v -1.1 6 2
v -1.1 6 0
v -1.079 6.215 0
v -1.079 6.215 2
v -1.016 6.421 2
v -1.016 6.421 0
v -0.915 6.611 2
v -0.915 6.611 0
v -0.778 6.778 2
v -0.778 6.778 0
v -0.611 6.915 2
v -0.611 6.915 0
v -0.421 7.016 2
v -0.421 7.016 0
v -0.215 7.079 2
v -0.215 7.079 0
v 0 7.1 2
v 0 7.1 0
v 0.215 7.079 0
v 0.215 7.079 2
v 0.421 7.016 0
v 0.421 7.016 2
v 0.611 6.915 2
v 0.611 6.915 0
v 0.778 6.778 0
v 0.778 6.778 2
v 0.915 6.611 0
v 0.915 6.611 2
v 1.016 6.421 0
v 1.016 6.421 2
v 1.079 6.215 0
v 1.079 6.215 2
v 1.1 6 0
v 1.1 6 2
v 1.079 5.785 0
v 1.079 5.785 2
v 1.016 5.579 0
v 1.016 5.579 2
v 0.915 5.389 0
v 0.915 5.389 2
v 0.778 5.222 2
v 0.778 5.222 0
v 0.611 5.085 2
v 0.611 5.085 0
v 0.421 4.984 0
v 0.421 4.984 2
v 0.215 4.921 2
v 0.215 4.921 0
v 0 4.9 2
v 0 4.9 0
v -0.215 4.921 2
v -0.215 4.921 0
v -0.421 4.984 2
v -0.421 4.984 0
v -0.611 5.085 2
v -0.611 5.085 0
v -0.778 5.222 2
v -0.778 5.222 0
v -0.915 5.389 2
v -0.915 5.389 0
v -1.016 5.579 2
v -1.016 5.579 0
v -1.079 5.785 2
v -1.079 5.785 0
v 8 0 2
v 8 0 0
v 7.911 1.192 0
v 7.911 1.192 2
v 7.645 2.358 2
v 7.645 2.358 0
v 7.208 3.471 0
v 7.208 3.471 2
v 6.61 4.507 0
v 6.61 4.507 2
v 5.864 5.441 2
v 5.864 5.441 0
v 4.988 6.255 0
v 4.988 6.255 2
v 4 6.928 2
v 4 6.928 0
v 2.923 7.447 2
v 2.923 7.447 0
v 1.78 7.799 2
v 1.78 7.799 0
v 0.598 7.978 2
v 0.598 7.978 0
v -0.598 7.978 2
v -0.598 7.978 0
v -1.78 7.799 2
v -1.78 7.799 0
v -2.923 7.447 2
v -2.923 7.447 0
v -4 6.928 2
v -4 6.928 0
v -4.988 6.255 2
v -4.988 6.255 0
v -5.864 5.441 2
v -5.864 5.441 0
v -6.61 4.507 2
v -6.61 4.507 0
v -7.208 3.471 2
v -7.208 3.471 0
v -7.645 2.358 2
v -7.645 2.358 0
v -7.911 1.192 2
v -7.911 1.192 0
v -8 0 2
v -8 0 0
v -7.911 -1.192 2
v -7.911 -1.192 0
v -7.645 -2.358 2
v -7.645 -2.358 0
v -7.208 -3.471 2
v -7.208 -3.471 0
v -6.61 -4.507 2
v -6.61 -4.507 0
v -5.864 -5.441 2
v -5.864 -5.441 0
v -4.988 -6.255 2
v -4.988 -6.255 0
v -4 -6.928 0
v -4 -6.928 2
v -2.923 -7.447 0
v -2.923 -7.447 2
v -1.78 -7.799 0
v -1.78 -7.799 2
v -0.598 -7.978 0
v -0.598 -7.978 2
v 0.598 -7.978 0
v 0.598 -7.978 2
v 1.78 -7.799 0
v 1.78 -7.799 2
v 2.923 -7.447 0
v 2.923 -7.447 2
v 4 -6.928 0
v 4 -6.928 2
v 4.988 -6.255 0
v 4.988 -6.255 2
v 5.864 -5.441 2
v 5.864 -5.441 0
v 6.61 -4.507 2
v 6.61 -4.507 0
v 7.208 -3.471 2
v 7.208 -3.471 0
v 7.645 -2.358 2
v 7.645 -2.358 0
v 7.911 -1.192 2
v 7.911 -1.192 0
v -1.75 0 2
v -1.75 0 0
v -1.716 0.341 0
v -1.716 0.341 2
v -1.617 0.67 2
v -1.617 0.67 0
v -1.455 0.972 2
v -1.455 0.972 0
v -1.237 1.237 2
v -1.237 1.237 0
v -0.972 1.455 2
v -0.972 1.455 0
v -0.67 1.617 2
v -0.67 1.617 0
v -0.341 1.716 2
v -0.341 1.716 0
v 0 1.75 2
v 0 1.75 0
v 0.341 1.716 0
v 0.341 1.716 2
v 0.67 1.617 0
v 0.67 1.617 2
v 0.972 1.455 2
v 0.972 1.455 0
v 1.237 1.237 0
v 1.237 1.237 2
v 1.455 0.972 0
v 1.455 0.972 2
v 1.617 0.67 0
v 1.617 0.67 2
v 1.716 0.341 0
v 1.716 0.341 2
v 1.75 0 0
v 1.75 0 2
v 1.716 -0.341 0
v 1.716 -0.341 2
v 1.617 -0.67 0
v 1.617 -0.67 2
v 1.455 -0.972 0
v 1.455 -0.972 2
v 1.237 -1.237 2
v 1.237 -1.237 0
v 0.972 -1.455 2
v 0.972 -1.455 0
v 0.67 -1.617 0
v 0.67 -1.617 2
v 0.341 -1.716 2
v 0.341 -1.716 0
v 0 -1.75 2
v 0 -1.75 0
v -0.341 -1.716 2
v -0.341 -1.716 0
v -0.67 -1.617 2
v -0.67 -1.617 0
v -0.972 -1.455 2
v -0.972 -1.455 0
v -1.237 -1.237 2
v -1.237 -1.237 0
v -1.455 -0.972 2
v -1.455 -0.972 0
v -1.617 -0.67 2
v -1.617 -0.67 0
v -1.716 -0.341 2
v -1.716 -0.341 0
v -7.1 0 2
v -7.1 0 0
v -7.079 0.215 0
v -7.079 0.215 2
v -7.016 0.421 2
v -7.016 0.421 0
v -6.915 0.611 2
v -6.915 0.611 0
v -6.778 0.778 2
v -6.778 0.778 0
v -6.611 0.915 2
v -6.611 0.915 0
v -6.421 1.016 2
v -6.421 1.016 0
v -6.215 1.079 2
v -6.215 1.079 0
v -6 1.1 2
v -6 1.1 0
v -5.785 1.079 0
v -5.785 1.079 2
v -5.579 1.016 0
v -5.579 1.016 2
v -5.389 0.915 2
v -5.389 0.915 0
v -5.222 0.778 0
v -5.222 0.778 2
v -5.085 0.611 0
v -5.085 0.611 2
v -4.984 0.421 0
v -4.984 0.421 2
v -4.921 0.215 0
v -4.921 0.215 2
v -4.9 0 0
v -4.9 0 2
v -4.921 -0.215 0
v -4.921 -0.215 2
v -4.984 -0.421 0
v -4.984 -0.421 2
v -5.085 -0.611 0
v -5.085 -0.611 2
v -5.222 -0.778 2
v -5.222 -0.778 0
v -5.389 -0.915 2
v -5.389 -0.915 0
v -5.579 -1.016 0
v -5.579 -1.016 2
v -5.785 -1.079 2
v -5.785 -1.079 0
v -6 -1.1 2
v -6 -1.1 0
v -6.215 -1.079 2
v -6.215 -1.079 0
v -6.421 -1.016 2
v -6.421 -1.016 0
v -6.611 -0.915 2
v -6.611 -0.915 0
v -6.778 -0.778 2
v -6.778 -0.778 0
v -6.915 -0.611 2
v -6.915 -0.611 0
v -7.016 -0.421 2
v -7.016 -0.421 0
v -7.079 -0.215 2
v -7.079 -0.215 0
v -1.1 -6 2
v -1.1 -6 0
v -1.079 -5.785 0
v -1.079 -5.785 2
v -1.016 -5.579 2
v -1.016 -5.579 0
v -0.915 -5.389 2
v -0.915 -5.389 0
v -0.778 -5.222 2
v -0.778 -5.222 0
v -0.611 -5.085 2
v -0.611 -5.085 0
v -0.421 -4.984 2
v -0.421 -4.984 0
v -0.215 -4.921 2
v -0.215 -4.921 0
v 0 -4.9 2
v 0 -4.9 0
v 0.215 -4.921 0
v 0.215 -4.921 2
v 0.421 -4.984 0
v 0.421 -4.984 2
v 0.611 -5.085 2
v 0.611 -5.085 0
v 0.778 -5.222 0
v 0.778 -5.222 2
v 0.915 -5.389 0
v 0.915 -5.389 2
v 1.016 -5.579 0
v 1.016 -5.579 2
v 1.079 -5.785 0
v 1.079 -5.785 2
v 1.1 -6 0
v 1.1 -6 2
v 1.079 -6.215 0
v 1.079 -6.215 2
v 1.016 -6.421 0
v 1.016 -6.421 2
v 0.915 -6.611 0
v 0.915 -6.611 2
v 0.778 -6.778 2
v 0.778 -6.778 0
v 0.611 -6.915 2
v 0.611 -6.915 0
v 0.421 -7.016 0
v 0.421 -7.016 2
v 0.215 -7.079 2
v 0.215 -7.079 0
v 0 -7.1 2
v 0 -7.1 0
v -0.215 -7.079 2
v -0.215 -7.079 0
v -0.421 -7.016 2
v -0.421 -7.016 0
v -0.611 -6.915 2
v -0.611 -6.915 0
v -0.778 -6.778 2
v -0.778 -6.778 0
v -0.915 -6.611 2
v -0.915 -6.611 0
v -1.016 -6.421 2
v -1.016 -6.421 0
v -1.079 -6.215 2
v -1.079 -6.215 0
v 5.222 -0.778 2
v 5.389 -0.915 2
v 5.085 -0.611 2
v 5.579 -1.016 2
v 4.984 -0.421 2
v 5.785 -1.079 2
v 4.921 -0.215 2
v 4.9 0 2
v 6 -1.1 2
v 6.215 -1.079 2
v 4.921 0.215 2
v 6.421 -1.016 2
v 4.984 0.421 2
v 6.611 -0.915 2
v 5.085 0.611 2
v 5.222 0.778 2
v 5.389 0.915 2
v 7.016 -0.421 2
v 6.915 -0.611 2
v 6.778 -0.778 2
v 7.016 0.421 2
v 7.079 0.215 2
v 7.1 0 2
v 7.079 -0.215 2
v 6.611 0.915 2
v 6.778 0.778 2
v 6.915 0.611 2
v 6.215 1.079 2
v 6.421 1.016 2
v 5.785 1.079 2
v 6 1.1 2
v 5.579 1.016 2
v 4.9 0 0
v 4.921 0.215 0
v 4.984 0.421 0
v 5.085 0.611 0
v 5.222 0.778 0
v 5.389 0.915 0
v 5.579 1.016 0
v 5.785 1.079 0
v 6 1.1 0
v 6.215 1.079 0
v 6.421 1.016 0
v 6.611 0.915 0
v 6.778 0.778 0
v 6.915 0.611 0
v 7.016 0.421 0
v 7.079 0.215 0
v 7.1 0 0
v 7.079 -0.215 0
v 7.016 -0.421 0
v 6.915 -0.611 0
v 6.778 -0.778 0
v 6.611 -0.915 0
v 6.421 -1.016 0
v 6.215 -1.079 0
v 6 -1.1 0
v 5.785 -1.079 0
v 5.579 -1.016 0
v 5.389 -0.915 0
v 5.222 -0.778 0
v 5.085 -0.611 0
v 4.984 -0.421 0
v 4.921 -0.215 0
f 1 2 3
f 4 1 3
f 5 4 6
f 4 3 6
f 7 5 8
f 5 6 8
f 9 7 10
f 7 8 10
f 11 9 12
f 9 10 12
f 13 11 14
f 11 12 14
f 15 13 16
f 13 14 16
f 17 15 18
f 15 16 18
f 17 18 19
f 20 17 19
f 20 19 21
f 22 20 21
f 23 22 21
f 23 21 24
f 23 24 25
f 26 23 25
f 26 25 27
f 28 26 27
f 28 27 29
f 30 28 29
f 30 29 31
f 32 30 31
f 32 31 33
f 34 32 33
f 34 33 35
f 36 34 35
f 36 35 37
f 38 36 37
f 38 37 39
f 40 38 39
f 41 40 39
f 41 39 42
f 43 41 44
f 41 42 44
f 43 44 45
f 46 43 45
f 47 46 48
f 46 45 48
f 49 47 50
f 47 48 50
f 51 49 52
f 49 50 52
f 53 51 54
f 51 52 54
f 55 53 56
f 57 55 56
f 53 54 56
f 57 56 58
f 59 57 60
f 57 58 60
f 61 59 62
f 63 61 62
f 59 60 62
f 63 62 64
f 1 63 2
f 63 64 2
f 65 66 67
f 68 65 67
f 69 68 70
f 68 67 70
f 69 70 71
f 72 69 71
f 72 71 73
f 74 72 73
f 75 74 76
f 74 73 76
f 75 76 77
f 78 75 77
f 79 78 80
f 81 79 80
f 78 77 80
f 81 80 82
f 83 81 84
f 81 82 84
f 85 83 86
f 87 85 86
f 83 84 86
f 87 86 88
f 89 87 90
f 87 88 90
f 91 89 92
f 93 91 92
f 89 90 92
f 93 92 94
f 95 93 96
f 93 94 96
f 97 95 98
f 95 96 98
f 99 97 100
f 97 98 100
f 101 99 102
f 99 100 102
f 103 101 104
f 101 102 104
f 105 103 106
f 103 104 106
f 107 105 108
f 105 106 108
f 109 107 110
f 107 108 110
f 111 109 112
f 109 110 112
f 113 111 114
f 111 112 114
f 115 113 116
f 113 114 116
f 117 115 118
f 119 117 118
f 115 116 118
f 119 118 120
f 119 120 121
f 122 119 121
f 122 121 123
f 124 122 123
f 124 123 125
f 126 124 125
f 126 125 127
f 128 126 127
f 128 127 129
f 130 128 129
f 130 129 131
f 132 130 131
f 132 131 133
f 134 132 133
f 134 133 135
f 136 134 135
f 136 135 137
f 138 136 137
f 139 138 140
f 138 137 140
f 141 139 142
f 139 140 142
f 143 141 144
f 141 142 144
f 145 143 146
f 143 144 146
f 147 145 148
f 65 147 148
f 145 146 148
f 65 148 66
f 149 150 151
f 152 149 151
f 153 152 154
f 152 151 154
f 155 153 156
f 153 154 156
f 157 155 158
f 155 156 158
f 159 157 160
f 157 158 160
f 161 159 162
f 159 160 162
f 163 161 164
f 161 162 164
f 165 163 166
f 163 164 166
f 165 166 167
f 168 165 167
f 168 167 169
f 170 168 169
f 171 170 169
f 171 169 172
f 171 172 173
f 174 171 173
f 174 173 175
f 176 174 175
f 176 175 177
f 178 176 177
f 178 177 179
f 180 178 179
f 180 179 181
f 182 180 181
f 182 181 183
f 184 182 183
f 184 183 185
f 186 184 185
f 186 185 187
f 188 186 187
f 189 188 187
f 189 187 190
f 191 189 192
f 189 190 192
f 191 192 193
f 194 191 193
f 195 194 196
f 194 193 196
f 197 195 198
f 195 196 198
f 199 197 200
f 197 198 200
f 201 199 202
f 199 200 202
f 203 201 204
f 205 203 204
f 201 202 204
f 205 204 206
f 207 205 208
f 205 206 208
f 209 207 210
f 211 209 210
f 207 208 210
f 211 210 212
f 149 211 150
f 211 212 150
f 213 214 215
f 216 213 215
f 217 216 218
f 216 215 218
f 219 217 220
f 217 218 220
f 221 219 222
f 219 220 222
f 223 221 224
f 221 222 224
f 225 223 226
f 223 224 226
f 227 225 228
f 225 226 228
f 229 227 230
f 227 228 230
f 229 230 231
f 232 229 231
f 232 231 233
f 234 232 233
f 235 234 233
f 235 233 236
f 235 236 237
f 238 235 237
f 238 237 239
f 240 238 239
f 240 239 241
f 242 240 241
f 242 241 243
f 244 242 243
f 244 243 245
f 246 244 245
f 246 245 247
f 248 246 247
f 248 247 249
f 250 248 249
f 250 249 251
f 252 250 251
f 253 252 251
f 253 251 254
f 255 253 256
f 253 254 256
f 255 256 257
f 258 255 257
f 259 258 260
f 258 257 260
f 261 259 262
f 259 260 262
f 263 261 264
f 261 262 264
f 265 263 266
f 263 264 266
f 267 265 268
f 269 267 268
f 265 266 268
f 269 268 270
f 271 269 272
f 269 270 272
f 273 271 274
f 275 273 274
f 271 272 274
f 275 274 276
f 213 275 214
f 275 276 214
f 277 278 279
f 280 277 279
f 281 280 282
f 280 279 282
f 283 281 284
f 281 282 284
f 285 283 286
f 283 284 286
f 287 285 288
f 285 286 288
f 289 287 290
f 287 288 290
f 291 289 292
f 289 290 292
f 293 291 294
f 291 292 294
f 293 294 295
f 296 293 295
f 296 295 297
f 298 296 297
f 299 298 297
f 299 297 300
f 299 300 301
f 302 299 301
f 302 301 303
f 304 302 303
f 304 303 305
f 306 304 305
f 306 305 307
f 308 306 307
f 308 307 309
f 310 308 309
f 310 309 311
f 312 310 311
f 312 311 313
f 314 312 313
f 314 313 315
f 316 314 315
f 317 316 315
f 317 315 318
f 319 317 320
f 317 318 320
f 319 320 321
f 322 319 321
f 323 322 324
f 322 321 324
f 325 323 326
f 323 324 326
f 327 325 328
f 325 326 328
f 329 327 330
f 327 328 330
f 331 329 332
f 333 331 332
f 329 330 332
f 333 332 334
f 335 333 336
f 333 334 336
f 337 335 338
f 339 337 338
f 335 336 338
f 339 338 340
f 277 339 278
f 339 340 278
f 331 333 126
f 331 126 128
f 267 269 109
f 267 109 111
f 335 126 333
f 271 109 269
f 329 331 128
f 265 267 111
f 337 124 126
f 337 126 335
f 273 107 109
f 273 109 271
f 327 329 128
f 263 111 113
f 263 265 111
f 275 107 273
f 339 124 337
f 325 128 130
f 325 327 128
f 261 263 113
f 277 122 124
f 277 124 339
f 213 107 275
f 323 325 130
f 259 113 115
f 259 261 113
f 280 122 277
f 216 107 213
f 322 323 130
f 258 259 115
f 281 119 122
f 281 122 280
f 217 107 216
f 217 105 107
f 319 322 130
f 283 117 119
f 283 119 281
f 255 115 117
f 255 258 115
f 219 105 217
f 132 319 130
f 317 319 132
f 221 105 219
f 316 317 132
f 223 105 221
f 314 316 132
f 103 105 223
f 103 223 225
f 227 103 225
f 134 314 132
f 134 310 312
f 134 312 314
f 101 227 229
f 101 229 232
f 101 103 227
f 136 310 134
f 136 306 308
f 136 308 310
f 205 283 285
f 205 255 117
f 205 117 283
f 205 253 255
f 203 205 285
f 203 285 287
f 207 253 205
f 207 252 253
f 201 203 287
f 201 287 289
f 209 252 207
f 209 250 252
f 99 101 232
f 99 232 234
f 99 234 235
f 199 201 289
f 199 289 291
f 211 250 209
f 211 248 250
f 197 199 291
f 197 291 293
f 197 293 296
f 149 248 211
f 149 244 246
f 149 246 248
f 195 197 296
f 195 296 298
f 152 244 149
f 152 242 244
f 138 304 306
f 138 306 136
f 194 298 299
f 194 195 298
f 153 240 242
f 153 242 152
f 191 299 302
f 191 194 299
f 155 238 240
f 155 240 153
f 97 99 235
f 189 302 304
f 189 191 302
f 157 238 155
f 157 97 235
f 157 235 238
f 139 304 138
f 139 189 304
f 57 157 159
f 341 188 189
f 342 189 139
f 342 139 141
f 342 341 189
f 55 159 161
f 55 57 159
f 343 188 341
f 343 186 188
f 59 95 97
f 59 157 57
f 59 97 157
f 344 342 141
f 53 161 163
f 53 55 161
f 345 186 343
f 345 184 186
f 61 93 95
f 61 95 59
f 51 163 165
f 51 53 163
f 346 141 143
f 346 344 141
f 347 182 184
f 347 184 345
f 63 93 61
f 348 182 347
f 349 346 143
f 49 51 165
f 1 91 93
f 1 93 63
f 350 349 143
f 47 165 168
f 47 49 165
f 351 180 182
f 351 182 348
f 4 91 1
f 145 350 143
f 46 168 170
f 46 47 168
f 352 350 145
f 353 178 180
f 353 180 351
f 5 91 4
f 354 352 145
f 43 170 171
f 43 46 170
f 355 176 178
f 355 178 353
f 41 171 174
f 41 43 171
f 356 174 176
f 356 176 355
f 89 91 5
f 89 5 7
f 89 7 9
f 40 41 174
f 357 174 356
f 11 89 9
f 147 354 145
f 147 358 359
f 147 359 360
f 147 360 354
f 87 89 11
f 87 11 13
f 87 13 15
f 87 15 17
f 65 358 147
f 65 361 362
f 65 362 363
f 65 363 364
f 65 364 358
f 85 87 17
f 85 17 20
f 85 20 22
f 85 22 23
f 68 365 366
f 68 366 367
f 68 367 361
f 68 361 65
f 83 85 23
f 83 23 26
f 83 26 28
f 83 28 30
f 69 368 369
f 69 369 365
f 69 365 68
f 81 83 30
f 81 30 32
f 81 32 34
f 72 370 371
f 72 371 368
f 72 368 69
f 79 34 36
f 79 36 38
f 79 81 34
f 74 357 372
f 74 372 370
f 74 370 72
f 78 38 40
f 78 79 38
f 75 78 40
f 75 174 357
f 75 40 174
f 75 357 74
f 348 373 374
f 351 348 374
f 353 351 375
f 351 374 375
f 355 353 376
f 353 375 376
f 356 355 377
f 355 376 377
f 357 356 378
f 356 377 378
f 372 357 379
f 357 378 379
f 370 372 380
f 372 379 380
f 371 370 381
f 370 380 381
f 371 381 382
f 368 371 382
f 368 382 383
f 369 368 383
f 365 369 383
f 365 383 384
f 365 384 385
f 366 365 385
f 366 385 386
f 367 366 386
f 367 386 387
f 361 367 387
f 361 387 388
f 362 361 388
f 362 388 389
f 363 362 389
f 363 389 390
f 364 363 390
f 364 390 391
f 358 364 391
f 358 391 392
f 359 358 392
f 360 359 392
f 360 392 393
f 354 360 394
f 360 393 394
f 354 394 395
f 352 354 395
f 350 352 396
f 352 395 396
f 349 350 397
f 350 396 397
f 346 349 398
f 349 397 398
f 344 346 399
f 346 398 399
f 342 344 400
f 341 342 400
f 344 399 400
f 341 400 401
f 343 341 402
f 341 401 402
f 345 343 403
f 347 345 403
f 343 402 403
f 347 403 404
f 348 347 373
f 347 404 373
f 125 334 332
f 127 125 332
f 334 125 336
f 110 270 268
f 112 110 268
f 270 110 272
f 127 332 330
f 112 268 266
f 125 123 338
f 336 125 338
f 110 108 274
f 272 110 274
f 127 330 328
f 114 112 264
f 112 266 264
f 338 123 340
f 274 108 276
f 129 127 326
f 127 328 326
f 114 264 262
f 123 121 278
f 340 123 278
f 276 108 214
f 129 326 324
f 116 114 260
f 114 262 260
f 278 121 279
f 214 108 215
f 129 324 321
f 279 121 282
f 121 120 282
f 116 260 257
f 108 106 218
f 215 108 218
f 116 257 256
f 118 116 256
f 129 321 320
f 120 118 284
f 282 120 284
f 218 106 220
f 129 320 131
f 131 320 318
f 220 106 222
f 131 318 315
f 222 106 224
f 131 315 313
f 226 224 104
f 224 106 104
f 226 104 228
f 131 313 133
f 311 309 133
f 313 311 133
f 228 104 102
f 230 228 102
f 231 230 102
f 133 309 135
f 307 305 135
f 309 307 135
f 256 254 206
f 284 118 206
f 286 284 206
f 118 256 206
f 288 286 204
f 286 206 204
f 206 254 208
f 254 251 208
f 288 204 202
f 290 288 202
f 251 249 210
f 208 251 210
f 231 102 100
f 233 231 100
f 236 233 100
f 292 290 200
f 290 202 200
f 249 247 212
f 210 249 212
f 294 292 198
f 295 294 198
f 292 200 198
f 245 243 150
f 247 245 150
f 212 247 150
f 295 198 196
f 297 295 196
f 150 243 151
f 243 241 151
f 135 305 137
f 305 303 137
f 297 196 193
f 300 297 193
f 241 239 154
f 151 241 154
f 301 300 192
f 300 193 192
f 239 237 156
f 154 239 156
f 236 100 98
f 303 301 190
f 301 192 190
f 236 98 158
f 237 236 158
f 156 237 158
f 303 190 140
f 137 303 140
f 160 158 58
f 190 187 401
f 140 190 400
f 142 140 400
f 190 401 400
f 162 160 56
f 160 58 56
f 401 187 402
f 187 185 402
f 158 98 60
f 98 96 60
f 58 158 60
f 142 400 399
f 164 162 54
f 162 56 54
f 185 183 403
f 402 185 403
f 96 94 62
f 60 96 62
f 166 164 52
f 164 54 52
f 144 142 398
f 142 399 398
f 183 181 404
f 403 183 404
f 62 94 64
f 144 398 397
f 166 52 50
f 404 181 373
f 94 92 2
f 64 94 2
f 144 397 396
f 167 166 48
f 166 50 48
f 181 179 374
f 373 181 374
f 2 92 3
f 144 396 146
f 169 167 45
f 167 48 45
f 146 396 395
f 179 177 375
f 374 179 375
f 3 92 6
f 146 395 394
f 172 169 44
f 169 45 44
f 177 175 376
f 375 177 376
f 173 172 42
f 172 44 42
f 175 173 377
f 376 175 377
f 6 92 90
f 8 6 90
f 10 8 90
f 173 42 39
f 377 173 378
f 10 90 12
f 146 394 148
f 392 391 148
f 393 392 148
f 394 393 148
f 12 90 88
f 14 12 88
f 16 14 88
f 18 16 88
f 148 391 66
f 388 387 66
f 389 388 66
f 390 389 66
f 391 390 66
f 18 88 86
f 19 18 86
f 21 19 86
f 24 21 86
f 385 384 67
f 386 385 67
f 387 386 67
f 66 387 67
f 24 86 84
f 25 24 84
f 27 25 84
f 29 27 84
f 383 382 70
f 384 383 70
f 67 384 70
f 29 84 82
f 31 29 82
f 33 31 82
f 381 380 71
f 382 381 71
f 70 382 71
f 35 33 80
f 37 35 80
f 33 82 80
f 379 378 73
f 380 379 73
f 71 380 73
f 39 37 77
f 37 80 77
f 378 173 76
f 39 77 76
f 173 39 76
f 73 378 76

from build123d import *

# Parameters (mm, degrees)
SKETCH_1_R          = 8
EXTRUDE_1_DEPTH     = 2
SKETCH_3_R          = 1.1
SKETCH_3_R_2        = 1.75
CUT_EXTRUDE_1_DEPTH = 12.489125293


with BuildPart() as part:
    # 草图1 → 凸台-拉伸1 (new body)
    with BuildSketch(Plane.XY):
        Circle(SKETCH_1_R)
    extrude(amount=EXTRUDE_1_DEPTH)

    # 草图3 → 切除-拉伸1 (cut, through all)
    with BuildSketch(Plane(origin=(0, 0, 0), x_dir=(-1, 0, 0), z_dir=(0, 0, -1))):
        with Locations((0, 6)):
            Circle(SKETCH_3_R)
        with Locations((6, 0)):
            Circle(SKETCH_3_R)
        with Locations((0, -6)):
            Circle(SKETCH_3_R)
        with Locations((-6, 0)):
            Circle(SKETCH_3_R)
        Circle(SKETCH_3_R_2)
    extrude(amount=-CUT_EXTRUDE_1_DEPTH, mode=Mode.SUBTRACT)


solid = part.part
